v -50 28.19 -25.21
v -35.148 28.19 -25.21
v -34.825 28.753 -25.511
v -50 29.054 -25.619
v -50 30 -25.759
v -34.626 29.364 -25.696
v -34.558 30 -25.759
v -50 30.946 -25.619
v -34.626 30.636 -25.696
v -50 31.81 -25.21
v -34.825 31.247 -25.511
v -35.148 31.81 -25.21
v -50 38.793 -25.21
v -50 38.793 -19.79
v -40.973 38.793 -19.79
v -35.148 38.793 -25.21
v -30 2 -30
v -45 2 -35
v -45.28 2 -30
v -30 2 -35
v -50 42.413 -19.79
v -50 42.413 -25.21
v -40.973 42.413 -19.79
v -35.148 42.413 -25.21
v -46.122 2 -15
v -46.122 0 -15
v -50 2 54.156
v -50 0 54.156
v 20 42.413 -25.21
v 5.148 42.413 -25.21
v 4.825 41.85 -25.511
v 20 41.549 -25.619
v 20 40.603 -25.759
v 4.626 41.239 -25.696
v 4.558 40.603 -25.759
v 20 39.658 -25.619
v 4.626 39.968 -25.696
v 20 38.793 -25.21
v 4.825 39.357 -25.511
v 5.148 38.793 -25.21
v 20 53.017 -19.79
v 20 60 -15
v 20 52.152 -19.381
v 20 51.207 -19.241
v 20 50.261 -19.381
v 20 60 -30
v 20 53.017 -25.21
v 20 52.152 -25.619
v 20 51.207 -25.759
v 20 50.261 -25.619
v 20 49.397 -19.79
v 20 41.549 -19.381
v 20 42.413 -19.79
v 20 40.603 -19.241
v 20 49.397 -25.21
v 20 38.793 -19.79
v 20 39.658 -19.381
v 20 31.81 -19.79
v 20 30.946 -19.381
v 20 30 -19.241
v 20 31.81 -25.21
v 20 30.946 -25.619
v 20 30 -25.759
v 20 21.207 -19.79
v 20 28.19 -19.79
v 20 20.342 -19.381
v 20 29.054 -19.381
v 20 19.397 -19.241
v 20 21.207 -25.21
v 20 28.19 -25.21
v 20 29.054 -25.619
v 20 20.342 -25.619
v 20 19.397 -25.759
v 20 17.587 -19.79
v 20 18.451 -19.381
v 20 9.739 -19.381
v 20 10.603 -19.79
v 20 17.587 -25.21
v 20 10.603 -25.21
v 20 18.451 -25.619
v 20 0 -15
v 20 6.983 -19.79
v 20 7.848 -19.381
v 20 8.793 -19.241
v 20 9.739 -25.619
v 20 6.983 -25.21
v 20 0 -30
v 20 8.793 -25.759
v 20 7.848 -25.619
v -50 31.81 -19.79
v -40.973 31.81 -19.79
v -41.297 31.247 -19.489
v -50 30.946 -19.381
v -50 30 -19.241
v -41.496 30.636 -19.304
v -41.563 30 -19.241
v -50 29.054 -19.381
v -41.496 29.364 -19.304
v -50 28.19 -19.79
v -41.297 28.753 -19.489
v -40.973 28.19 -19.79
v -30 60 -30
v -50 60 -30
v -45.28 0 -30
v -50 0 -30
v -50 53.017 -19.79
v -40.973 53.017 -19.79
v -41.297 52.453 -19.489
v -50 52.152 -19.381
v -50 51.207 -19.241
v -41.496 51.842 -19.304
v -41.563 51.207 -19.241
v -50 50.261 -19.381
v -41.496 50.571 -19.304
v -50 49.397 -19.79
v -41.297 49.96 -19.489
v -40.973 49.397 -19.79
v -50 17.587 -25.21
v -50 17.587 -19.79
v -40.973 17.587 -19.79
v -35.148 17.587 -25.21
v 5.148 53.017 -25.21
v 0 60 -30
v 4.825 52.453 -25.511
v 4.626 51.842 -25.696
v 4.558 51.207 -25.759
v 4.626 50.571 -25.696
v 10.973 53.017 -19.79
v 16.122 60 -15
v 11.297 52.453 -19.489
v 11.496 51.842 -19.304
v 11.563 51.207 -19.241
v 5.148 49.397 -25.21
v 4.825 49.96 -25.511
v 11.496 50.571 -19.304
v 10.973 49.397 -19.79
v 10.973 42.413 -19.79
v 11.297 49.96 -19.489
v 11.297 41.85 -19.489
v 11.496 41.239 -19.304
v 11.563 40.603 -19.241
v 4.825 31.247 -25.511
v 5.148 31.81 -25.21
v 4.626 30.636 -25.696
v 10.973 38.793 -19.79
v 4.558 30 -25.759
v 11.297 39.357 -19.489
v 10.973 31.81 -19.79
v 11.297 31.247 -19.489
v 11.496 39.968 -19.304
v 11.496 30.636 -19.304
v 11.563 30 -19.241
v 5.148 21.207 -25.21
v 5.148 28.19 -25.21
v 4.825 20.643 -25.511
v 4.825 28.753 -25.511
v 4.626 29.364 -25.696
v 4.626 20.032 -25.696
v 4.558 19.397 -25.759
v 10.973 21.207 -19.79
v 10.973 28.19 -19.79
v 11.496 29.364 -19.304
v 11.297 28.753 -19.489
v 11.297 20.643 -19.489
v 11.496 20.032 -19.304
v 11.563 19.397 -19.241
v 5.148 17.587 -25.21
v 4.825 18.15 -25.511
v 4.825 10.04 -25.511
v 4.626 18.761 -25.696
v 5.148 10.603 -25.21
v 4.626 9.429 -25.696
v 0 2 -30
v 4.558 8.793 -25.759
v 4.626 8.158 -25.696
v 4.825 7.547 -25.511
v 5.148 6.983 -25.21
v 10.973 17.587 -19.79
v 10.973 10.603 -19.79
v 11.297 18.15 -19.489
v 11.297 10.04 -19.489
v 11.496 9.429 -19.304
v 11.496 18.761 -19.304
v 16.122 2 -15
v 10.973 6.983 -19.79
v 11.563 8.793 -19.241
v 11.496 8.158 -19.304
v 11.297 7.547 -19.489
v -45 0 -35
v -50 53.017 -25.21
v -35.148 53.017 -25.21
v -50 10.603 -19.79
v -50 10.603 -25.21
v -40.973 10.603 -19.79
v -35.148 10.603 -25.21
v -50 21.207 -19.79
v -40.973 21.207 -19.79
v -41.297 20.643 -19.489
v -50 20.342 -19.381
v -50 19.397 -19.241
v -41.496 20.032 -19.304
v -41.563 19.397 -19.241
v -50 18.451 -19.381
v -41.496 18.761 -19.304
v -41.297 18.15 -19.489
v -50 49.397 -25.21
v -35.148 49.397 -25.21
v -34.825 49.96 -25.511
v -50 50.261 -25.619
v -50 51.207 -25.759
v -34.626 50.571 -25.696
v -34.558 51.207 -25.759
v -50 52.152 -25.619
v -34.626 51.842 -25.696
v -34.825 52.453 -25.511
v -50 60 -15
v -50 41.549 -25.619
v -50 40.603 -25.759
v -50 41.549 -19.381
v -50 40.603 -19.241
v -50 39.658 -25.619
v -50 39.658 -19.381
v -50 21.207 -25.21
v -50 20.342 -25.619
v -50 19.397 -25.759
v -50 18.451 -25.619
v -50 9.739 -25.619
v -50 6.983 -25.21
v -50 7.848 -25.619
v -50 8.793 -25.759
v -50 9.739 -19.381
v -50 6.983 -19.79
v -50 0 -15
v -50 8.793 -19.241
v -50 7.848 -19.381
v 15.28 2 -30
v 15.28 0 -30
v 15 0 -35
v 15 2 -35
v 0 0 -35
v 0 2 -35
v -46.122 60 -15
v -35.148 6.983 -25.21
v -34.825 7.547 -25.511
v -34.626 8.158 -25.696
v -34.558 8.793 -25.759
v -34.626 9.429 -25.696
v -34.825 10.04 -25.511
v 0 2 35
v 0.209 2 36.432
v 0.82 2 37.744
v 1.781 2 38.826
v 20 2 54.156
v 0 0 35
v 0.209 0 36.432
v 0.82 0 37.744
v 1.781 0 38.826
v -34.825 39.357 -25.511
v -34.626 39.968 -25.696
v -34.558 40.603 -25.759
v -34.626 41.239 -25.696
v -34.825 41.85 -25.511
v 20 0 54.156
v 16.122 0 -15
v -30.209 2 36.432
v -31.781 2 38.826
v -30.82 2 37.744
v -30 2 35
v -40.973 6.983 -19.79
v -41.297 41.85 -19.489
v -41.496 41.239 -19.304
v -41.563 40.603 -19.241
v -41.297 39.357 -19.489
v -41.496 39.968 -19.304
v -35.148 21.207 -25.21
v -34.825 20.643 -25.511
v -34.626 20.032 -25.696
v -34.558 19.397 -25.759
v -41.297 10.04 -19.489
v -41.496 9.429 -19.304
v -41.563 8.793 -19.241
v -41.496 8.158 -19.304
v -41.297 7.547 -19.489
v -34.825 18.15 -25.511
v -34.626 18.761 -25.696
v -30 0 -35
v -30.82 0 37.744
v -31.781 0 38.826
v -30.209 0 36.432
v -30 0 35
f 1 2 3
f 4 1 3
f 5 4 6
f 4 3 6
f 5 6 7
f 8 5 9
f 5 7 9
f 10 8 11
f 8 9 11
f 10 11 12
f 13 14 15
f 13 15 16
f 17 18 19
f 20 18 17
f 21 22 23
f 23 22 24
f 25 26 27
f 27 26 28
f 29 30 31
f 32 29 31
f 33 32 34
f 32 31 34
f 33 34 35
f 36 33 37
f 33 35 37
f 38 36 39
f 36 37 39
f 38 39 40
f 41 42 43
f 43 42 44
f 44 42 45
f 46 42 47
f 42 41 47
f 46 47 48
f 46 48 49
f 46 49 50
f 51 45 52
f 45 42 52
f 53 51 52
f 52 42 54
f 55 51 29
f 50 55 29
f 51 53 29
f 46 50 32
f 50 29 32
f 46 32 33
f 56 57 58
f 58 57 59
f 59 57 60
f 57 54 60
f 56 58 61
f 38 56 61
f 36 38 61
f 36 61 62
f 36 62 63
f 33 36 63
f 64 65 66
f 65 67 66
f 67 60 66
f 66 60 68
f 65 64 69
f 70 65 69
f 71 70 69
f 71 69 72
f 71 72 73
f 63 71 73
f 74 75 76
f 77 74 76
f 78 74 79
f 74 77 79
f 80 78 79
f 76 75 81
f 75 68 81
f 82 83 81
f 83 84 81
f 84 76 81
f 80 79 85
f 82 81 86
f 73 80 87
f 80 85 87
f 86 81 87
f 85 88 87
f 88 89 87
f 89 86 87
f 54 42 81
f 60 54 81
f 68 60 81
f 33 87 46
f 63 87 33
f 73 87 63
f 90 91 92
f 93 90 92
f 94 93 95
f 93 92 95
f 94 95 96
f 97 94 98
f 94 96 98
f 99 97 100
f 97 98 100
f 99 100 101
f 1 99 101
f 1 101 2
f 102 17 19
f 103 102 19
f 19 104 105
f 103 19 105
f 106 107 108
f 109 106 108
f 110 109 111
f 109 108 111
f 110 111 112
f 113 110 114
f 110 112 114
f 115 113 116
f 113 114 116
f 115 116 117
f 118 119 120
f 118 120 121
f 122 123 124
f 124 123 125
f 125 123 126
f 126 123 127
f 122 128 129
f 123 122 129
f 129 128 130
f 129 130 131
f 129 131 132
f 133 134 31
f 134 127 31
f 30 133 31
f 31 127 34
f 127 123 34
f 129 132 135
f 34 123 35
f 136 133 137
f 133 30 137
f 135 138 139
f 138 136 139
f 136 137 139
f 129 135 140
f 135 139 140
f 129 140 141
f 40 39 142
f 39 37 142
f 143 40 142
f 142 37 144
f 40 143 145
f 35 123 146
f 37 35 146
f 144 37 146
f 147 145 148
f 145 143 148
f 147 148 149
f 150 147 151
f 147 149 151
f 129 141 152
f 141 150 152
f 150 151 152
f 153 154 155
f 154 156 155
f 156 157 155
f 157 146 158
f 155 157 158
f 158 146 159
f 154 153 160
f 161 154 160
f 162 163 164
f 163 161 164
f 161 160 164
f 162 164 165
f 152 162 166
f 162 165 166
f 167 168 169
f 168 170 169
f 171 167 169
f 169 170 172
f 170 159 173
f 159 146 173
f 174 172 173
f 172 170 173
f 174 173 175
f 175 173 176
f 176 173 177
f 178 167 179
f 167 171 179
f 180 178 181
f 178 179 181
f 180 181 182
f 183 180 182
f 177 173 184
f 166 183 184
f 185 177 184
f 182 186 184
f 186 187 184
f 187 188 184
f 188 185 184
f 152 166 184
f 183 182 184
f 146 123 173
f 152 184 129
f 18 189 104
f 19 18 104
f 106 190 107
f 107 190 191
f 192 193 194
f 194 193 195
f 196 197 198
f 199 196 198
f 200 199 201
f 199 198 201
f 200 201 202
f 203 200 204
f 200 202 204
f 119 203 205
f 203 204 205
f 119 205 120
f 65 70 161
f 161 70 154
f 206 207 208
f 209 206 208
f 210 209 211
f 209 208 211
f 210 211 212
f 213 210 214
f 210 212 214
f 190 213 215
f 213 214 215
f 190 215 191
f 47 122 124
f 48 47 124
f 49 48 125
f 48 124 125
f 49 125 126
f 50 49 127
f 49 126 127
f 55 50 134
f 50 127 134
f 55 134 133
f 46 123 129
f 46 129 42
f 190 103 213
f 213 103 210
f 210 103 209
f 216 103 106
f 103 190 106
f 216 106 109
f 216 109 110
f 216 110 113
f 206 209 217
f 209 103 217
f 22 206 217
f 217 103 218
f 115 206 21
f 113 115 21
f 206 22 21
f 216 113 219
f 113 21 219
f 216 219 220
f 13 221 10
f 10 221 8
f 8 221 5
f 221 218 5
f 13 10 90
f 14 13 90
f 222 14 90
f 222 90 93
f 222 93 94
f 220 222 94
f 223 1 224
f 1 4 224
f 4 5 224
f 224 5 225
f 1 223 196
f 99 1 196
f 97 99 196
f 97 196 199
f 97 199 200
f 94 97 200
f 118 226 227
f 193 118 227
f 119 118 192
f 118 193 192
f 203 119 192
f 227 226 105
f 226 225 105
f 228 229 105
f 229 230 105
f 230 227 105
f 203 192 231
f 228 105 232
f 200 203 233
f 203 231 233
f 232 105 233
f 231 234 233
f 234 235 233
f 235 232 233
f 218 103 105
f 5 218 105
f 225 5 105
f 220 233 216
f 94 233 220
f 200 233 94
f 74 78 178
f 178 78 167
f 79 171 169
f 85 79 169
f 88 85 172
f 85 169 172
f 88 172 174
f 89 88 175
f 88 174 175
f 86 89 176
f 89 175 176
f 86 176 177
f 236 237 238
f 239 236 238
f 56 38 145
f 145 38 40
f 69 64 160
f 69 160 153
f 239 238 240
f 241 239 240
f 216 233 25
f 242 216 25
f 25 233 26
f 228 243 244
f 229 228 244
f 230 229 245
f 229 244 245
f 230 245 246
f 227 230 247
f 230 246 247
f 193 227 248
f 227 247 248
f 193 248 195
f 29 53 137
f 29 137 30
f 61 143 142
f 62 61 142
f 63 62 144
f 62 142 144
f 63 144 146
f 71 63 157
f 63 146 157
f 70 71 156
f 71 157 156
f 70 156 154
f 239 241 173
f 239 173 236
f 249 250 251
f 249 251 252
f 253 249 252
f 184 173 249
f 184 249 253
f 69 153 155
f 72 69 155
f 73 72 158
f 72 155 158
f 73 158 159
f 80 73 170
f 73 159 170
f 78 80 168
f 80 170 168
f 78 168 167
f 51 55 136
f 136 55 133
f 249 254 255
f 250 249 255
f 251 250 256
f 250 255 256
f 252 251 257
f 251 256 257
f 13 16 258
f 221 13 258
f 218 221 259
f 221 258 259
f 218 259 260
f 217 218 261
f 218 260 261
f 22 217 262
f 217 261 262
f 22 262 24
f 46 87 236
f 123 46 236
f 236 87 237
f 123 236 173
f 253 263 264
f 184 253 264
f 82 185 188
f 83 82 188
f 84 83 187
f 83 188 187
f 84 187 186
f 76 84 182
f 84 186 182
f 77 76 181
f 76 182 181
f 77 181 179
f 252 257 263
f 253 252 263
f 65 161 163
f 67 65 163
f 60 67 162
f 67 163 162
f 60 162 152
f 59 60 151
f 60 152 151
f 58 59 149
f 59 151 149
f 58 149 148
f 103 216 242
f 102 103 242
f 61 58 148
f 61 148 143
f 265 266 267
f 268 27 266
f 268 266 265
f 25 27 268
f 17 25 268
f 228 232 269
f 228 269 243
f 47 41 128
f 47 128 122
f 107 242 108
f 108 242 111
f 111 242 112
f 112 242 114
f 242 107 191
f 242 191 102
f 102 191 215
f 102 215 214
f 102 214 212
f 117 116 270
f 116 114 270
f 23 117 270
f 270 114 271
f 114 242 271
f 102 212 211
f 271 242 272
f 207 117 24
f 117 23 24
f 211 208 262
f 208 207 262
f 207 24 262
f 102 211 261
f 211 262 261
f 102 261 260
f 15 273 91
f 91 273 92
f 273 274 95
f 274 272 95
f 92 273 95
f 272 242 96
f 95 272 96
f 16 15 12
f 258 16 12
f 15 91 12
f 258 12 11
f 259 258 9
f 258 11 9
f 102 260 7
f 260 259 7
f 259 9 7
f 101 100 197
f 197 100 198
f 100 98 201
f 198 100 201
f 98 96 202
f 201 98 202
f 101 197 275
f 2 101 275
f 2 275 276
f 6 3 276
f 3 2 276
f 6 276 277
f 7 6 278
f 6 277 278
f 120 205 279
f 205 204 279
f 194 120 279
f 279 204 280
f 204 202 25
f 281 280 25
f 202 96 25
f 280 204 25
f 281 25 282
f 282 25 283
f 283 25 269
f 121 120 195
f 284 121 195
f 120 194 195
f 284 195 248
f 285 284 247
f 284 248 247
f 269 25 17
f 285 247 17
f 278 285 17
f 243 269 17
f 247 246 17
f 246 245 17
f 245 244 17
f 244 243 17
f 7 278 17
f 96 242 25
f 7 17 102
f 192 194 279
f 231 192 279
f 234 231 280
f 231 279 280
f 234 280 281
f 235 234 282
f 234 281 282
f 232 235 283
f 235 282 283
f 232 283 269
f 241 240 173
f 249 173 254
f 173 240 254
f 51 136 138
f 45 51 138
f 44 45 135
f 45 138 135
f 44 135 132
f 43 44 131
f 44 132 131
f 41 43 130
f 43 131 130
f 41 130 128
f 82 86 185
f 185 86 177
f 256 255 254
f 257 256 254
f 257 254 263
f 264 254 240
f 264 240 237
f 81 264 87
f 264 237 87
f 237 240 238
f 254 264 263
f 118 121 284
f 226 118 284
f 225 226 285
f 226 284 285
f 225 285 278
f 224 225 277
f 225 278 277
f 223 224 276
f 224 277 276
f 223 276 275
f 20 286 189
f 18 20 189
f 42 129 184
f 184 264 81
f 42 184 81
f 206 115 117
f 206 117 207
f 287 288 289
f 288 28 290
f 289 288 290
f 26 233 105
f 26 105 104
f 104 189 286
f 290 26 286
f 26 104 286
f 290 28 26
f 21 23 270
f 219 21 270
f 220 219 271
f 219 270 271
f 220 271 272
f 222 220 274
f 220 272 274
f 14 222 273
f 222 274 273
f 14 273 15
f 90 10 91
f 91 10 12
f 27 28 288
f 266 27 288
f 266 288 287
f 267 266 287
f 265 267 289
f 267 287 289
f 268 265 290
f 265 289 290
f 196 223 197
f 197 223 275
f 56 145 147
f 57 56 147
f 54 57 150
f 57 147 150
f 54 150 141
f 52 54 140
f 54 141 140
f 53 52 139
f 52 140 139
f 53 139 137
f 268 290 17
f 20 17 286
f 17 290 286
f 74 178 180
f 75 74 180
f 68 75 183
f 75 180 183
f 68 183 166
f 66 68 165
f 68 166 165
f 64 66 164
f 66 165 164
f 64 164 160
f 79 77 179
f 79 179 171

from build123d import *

# Parameters (mm, degrees)
BOSS_EXTRUDE1_DEPTH     = 2
BOSS_EXTRUDE3_DEPTH     = 60
CUT_EXTRUDE1_DEPTH      = 84.263943614
CUT_EXTRUDE1_DEPTH_BACK = 84.263943614
BOSS_EXTRUDE5_DEPTH     = 2
BOSS_EXTRUDE6_DEPTH     = 60
CUT_EXTRUDE2_DEPTH      = 107.9246665
CUT_EXTRUDE2_DEPTH_BACK = 107.9246665


with BuildPart() as part:
    # Sketch1 → Boss-Extrude1 (new body)
    with BuildSketch(Plane(origin=(0, 0, 0), x_dir=(1, 0, 0), z_dir=(0, 1, 0))):
        with BuildLine():
            ThreePointArc((0, -35), (0.467014585, -37.109986547), (1.780817291, -38.825815297))
            Line((1.780817291, -38.825815297), (20, -54.156110515))
            Line((20, -54.156110515), (16.121628113, 15))
            Line((16.121628113, 15), (20, 15))
            Line((20, 15), (20, 30))
            Line((20, 30), (15.280407028, 30))
            Line((15.280407028, 30), (15, 35))
            Line((15, 35), (0, 35))
            Line((0, 35), (0, -35))
        make_face()
    extrude(amount=BOSS_EXTRUDE1_DEPTH)

    # Sketch1<5> → Boss-Extrude3 (add)
    with BuildSketch(Plane(origin=(0, 0, 0), x_dir=(1, 0, 0), z_dir=(0, 1, 0))):
        Polygon((0, 30), (16.121628113, 15), (20, 15), (20, 30), align=None)
    extrude(amount=BOSS_EXTRUDE3_DEPTH)

    # Sketch4 → Cut-Extrude1 (cut, two sides: drawn at the far end of the back side and taken through both)
    with BuildSketch(Plane(origin=(20, 0, 0), x_dir=(0, 0, -1), z_dir=(1, 0, 0)).offset(-CUT_EXTRUDE1_DEPTH_BACK)):
        with BuildLine():
            Line((19.79, 53.016666667), (25.21, 53.016666667))
            ThreePointArc((25.21, 53.016666667), (25.758864833, 51.206666667), (25.21, 49.396666667))
            Line((25.21, 49.396666667), (19.79, 49.396666667))
            ThreePointArc((19.79, 49.396666667), (19.241135167, 51.206666667), (19.79, 53.016666667))
        make_face()
        with BuildLine():
            Line((19.79, 42.413333333), (25.21, 42.413333333))
            ThreePointArc((25.21, 42.413333333), (25.758864833, 40.603333333), (25.21, 38.793333333))
            Line((25.21, 38.793333333), (19.79, 38.793333333))
            ThreePointArc((19.79, 38.793333333), (19.241135167, 40.603333333), (19.79, 42.413333333))
        make_face()
        with BuildLine():
            Line((19.79, 31.81), (25.21, 31.81))
            ThreePointArc((25.21, 31.81), (25.758864833, 30), (25.21, 28.19))
            Line((25.21, 28.19), (19.79, 28.19))
            ThreePointArc((19.79, 28.19), (19.241135167, 30), (19.79, 31.81))
        make_face()
        with BuildLine():
            Line((19.79, 21.206666667), (25.21, 21.206666667))
            ThreePointArc((25.21, 21.206666667), (25.758864833, 19.396666667), (25.21, 17.586666667))
            Line((25.21, 17.586666667), (19.79, 17.586666667))
            ThreePointArc((19.79, 17.586666667), (19.241135167, 19.396666667), (19.79, 21.206666667))
        make_face()
        with BuildLine():
            Line((19.79, 10.603333333), (25.21, 10.603333333))
            ThreePointArc((25.21, 10.603333333), (25.758864833, 8.793333333), (25.21, 6.983333333))
            Line((25.21, 6.983333333), (19.79, 6.983333333))
            ThreePointArc((19.79, 6.983333333), (19.241135167, 8.793333333), (19.79, 10.603333333))
        make_face()
    extrude(amount=CUT_EXTRUDE1_DEPTH + CUT_EXTRUDE1_DEPTH_BACK, mode=Mode.SUBTRACT)


with BuildPart() as body_2:
    # Sketch1<9> → Boss-Extrude5 (new body)
    with BuildSketch(Plane(origin=(0, 0, 0), x_dir=(1, 0, 0), z_dir=(0, 1, 0))):
        with BuildLine():
            Line((-50, 15), (-46.121628113, 15))
            Line((-46.121628113, 15), (-50, -54.156110515))
            Line((-50, -54.156110515), (-31.780817291, -38.825815297))
            ThreePointArc((-31.780817291, -38.825815297), (-30.467014585, -37.109986547), (-30, -35))
            Line((-30, -35), (-30, 35))
            Line((-30, 35), (-45, 35))
            Line((-45, 35), (-45.280407028, 30))
            Line((-45.280407028, 30), (-50, 30))
            Line((-50, 30), (-50, 15))
        make_face()
    extrude(amount=BOSS_EXTRUDE5_DEPTH)

    # Sketch1<10> → Boss-Extrude6 (add)
    with BuildSketch(Plane(origin=(0, 0, 0), x_dir=(1, 0, 0), z_dir=(0, 1, 0))):
        Polygon((-30, 30), (-50, 30), (-50, 15), (-46.121628113, 15), align=None)
    extrude(amount=BOSS_EXTRUDE6_DEPTH)

    # Sketch7 → Cut-Extrude2 (cut, two sides: drawn at the far end of the back side and taken through both)
    with BuildSketch(Plane.ZY.offset(50).offset(-CUT_EXTRUDE2_DEPTH_BACK)):
        with BuildLine():
            Line((-25.21, 53.016666667), (-19.79, 53.016666667))
            ThreePointArc((-19.79, 53.016666667), (-19.241135167, 51.206666667), (-19.79, 49.396666667))
            Line((-19.79, 49.396666667), (-25.21, 49.396666667))
            ThreePointArc((-25.21, 49.396666667), (-25.758864833, 51.206666667), (-25.21, 53.016666667))
        make_face()
        with BuildLine():
            Line((-25.21, 42.413333333), (-19.79, 42.413333333))
            ThreePointArc((-19.79, 42.413333333), (-19.241135167, 40.603333333), (-19.79, 38.793333333))
            Line((-19.79, 38.793333333), (-25.21, 38.793333333))
            ThreePointArc((-25.21, 38.793333333), (-25.758864833, 40.603333333), (-25.21, 42.413333333))
        make_face()
        with BuildLine():
            Line((-25.21, 31.81), (-19.79, 31.81))
            ThreePointArc((-19.79, 31.81), (-19.241135167, 30), (-19.79, 28.19))
            Line((-19.79, 28.19), (-25.21, 28.19))
            ThreePointArc((-25.21, 28.19), (-25.758864833, 30), (-25.21, 31.81))
        make_face()
        with BuildLine():
            Line((-25.21, 21.206666667), (-19.79, 21.206666667))
            ThreePointArc((-19.79, 21.206666667), (-19.241135167, 19.396666667), (-19.79, 17.586666667))
            Line((-19.79, 17.586666667), (-25.21, 17.586666667))
            ThreePointArc((-25.21, 17.586666667), (-25.758864833, 19.396666667), (-25.21, 21.206666667))
        make_face()
        with BuildLine():
            Line((-25.21, 10.603333333), (-19.79, 10.603333333))
            ThreePointArc((-19.79, 10.603333333), (-19.241135167, 8.793333333), (-19.79, 6.983333333))
            Line((-19.79, 6.983333333), (-25.21, 6.983333333))
            ThreePointArc((-25.21, 6.983333333), (-25.758864833, 8.793333333), (-25.21, 10.603333333))
        make_face()
    extrude(amount=CUT_EXTRUDE2_DEPTH + CUT_EXTRUDE2_DEPTH_BACK, mode=Mode.SUBTRACT)


solid = Compound([part.part, body_2.part])
